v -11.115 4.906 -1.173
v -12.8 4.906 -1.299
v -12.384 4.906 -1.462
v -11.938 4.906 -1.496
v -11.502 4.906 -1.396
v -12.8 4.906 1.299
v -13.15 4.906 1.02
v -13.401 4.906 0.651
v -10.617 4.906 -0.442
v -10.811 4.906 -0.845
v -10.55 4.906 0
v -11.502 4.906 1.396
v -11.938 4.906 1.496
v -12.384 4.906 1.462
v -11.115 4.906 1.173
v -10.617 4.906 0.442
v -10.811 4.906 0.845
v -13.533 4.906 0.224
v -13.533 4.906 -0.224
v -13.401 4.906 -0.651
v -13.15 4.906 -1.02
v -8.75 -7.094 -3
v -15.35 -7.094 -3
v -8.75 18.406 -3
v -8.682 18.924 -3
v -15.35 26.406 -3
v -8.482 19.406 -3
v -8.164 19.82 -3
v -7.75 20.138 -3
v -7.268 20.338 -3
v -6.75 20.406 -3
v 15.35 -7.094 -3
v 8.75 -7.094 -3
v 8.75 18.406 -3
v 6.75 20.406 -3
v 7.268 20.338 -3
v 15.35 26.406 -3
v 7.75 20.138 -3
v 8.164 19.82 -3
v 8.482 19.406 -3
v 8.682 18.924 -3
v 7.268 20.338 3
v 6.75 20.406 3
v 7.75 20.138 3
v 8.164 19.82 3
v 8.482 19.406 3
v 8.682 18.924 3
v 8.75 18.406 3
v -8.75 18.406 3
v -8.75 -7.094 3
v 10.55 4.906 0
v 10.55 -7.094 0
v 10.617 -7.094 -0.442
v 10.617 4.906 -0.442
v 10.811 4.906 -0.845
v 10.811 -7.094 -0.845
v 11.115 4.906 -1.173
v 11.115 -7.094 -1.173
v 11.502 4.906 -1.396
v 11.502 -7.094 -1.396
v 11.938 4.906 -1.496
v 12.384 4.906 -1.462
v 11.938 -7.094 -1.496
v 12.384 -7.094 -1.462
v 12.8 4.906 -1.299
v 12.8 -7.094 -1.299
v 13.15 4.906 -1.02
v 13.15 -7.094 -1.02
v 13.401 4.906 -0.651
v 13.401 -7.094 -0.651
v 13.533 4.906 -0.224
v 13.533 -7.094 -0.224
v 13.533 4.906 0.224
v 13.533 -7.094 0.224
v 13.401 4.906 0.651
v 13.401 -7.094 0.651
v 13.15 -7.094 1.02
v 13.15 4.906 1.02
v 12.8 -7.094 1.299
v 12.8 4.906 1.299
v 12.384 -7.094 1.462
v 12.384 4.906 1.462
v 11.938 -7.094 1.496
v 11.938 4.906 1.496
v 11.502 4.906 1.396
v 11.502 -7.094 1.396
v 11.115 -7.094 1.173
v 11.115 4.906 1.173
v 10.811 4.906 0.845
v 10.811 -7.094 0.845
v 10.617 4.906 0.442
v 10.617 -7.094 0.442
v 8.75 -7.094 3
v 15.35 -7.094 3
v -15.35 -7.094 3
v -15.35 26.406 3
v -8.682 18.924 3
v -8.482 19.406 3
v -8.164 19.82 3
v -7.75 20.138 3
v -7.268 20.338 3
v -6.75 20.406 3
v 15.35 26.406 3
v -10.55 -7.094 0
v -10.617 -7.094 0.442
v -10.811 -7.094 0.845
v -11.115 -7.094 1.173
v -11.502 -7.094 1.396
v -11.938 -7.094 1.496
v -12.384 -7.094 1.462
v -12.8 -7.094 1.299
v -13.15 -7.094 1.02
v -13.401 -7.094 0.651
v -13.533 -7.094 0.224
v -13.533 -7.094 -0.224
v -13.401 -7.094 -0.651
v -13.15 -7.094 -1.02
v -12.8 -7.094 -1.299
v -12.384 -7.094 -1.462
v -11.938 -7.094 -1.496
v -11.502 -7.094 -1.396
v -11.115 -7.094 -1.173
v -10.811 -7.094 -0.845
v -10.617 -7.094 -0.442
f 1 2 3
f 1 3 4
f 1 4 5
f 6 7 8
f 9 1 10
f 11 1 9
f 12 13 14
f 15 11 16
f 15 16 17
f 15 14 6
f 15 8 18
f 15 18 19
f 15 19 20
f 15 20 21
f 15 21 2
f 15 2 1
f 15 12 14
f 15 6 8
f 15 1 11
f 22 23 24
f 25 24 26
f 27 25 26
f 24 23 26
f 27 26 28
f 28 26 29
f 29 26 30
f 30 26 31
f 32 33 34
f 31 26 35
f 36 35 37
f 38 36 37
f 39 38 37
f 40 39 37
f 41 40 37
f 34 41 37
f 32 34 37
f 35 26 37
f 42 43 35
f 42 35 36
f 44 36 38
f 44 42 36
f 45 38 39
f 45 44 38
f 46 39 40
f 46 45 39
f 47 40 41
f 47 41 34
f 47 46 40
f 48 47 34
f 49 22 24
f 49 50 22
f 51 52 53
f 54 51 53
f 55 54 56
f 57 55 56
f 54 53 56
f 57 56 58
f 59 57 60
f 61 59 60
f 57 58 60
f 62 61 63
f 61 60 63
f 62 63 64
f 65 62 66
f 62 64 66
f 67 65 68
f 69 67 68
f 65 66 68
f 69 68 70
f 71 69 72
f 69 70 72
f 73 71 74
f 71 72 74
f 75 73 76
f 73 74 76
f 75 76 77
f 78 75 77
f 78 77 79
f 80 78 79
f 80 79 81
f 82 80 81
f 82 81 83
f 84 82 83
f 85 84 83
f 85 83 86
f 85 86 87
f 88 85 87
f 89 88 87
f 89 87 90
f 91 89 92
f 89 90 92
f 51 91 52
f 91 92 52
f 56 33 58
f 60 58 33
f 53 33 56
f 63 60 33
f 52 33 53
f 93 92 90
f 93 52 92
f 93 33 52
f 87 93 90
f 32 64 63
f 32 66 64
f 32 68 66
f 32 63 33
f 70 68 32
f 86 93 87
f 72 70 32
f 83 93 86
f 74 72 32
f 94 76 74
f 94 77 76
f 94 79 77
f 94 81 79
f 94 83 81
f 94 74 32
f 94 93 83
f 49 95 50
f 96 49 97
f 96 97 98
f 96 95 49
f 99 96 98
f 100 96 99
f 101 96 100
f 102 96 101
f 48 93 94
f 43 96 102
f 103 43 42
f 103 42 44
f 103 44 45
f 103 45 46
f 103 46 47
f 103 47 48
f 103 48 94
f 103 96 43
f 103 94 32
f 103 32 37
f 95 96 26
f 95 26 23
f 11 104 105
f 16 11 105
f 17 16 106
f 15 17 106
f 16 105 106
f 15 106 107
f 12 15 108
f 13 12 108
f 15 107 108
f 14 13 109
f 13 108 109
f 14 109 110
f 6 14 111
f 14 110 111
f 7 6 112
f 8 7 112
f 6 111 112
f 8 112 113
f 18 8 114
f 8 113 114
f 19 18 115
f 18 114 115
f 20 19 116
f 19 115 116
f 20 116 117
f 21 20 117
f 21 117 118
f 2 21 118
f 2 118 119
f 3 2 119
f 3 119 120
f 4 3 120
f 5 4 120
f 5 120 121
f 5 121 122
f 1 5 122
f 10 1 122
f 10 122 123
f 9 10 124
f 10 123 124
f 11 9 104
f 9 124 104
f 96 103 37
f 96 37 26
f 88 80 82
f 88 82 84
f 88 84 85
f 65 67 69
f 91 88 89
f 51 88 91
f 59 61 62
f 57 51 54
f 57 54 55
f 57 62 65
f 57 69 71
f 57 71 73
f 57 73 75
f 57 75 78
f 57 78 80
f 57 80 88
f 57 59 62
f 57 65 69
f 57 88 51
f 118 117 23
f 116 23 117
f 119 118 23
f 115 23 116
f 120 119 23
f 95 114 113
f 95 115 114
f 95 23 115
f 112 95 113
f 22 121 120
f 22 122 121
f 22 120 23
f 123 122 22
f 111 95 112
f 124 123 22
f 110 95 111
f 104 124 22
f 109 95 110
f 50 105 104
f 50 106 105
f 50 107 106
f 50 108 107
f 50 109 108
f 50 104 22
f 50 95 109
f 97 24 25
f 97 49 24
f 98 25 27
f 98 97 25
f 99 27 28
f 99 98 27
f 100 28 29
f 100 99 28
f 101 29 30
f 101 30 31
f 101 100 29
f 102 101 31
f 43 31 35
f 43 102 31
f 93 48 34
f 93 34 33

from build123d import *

# Parameters (mm, degrees)
BOSS_EXTRUDE1_DEPTH = 3
SKETCH2_R           = 1.5
CUT_EXTRUDE1_DEPTH  = 12


with BuildPart() as part:
    # Sketch1 → Boss-Extrude1 (new, symmetric)
    with BuildSketch(Plane.XY):
        with BuildLine():
            Line((-6.75, 20.40625), (6.75, 20.40625))
            ThreePointArc((6.75, 20.40625), (8.164213562, 19.820463562), (8.75, 18.40625))
            Line((8.75, 18.40625), (8.75, -7.09375))
            Line((8.75, -7.09375), (15.35, -7.09375))
            Line((15.35, -7.09375), (15.35, 26.40625))
            Line((15.35, 26.40625), (-15.35, 26.40625))
            Line((-15.35, 26.40625), (-15.35, -7.09375))
            Line((-15.35, -7.09375), (-8.75, -7.09375))
            Line((-8.75, -7.09375), (-8.75, 18.40625))
            ThreePointArc((-8.75, 18.40625), (-8.164213562, 19.820463562), (-6.75, 20.40625))
        make_face()
    extrude(amount=BOSS_EXTRUDE1_DEPTH, both=True)

    # Sketch2 → Cut-Extrude1 (cut)
    with BuildSketch(Plane.XZ.offset(7.09375)):
        with Locations((-12.05, 0)):
            Circle(SKETCH2_R)
        with Locations(Location((12.05, 0, 0), (0, 0, 180))):
            Circle(SKETCH2_R)
    extrude(amount=-CUT_EXTRUDE1_DEPTH, mode=Mode.SUBTRACT)


solid = part.part
